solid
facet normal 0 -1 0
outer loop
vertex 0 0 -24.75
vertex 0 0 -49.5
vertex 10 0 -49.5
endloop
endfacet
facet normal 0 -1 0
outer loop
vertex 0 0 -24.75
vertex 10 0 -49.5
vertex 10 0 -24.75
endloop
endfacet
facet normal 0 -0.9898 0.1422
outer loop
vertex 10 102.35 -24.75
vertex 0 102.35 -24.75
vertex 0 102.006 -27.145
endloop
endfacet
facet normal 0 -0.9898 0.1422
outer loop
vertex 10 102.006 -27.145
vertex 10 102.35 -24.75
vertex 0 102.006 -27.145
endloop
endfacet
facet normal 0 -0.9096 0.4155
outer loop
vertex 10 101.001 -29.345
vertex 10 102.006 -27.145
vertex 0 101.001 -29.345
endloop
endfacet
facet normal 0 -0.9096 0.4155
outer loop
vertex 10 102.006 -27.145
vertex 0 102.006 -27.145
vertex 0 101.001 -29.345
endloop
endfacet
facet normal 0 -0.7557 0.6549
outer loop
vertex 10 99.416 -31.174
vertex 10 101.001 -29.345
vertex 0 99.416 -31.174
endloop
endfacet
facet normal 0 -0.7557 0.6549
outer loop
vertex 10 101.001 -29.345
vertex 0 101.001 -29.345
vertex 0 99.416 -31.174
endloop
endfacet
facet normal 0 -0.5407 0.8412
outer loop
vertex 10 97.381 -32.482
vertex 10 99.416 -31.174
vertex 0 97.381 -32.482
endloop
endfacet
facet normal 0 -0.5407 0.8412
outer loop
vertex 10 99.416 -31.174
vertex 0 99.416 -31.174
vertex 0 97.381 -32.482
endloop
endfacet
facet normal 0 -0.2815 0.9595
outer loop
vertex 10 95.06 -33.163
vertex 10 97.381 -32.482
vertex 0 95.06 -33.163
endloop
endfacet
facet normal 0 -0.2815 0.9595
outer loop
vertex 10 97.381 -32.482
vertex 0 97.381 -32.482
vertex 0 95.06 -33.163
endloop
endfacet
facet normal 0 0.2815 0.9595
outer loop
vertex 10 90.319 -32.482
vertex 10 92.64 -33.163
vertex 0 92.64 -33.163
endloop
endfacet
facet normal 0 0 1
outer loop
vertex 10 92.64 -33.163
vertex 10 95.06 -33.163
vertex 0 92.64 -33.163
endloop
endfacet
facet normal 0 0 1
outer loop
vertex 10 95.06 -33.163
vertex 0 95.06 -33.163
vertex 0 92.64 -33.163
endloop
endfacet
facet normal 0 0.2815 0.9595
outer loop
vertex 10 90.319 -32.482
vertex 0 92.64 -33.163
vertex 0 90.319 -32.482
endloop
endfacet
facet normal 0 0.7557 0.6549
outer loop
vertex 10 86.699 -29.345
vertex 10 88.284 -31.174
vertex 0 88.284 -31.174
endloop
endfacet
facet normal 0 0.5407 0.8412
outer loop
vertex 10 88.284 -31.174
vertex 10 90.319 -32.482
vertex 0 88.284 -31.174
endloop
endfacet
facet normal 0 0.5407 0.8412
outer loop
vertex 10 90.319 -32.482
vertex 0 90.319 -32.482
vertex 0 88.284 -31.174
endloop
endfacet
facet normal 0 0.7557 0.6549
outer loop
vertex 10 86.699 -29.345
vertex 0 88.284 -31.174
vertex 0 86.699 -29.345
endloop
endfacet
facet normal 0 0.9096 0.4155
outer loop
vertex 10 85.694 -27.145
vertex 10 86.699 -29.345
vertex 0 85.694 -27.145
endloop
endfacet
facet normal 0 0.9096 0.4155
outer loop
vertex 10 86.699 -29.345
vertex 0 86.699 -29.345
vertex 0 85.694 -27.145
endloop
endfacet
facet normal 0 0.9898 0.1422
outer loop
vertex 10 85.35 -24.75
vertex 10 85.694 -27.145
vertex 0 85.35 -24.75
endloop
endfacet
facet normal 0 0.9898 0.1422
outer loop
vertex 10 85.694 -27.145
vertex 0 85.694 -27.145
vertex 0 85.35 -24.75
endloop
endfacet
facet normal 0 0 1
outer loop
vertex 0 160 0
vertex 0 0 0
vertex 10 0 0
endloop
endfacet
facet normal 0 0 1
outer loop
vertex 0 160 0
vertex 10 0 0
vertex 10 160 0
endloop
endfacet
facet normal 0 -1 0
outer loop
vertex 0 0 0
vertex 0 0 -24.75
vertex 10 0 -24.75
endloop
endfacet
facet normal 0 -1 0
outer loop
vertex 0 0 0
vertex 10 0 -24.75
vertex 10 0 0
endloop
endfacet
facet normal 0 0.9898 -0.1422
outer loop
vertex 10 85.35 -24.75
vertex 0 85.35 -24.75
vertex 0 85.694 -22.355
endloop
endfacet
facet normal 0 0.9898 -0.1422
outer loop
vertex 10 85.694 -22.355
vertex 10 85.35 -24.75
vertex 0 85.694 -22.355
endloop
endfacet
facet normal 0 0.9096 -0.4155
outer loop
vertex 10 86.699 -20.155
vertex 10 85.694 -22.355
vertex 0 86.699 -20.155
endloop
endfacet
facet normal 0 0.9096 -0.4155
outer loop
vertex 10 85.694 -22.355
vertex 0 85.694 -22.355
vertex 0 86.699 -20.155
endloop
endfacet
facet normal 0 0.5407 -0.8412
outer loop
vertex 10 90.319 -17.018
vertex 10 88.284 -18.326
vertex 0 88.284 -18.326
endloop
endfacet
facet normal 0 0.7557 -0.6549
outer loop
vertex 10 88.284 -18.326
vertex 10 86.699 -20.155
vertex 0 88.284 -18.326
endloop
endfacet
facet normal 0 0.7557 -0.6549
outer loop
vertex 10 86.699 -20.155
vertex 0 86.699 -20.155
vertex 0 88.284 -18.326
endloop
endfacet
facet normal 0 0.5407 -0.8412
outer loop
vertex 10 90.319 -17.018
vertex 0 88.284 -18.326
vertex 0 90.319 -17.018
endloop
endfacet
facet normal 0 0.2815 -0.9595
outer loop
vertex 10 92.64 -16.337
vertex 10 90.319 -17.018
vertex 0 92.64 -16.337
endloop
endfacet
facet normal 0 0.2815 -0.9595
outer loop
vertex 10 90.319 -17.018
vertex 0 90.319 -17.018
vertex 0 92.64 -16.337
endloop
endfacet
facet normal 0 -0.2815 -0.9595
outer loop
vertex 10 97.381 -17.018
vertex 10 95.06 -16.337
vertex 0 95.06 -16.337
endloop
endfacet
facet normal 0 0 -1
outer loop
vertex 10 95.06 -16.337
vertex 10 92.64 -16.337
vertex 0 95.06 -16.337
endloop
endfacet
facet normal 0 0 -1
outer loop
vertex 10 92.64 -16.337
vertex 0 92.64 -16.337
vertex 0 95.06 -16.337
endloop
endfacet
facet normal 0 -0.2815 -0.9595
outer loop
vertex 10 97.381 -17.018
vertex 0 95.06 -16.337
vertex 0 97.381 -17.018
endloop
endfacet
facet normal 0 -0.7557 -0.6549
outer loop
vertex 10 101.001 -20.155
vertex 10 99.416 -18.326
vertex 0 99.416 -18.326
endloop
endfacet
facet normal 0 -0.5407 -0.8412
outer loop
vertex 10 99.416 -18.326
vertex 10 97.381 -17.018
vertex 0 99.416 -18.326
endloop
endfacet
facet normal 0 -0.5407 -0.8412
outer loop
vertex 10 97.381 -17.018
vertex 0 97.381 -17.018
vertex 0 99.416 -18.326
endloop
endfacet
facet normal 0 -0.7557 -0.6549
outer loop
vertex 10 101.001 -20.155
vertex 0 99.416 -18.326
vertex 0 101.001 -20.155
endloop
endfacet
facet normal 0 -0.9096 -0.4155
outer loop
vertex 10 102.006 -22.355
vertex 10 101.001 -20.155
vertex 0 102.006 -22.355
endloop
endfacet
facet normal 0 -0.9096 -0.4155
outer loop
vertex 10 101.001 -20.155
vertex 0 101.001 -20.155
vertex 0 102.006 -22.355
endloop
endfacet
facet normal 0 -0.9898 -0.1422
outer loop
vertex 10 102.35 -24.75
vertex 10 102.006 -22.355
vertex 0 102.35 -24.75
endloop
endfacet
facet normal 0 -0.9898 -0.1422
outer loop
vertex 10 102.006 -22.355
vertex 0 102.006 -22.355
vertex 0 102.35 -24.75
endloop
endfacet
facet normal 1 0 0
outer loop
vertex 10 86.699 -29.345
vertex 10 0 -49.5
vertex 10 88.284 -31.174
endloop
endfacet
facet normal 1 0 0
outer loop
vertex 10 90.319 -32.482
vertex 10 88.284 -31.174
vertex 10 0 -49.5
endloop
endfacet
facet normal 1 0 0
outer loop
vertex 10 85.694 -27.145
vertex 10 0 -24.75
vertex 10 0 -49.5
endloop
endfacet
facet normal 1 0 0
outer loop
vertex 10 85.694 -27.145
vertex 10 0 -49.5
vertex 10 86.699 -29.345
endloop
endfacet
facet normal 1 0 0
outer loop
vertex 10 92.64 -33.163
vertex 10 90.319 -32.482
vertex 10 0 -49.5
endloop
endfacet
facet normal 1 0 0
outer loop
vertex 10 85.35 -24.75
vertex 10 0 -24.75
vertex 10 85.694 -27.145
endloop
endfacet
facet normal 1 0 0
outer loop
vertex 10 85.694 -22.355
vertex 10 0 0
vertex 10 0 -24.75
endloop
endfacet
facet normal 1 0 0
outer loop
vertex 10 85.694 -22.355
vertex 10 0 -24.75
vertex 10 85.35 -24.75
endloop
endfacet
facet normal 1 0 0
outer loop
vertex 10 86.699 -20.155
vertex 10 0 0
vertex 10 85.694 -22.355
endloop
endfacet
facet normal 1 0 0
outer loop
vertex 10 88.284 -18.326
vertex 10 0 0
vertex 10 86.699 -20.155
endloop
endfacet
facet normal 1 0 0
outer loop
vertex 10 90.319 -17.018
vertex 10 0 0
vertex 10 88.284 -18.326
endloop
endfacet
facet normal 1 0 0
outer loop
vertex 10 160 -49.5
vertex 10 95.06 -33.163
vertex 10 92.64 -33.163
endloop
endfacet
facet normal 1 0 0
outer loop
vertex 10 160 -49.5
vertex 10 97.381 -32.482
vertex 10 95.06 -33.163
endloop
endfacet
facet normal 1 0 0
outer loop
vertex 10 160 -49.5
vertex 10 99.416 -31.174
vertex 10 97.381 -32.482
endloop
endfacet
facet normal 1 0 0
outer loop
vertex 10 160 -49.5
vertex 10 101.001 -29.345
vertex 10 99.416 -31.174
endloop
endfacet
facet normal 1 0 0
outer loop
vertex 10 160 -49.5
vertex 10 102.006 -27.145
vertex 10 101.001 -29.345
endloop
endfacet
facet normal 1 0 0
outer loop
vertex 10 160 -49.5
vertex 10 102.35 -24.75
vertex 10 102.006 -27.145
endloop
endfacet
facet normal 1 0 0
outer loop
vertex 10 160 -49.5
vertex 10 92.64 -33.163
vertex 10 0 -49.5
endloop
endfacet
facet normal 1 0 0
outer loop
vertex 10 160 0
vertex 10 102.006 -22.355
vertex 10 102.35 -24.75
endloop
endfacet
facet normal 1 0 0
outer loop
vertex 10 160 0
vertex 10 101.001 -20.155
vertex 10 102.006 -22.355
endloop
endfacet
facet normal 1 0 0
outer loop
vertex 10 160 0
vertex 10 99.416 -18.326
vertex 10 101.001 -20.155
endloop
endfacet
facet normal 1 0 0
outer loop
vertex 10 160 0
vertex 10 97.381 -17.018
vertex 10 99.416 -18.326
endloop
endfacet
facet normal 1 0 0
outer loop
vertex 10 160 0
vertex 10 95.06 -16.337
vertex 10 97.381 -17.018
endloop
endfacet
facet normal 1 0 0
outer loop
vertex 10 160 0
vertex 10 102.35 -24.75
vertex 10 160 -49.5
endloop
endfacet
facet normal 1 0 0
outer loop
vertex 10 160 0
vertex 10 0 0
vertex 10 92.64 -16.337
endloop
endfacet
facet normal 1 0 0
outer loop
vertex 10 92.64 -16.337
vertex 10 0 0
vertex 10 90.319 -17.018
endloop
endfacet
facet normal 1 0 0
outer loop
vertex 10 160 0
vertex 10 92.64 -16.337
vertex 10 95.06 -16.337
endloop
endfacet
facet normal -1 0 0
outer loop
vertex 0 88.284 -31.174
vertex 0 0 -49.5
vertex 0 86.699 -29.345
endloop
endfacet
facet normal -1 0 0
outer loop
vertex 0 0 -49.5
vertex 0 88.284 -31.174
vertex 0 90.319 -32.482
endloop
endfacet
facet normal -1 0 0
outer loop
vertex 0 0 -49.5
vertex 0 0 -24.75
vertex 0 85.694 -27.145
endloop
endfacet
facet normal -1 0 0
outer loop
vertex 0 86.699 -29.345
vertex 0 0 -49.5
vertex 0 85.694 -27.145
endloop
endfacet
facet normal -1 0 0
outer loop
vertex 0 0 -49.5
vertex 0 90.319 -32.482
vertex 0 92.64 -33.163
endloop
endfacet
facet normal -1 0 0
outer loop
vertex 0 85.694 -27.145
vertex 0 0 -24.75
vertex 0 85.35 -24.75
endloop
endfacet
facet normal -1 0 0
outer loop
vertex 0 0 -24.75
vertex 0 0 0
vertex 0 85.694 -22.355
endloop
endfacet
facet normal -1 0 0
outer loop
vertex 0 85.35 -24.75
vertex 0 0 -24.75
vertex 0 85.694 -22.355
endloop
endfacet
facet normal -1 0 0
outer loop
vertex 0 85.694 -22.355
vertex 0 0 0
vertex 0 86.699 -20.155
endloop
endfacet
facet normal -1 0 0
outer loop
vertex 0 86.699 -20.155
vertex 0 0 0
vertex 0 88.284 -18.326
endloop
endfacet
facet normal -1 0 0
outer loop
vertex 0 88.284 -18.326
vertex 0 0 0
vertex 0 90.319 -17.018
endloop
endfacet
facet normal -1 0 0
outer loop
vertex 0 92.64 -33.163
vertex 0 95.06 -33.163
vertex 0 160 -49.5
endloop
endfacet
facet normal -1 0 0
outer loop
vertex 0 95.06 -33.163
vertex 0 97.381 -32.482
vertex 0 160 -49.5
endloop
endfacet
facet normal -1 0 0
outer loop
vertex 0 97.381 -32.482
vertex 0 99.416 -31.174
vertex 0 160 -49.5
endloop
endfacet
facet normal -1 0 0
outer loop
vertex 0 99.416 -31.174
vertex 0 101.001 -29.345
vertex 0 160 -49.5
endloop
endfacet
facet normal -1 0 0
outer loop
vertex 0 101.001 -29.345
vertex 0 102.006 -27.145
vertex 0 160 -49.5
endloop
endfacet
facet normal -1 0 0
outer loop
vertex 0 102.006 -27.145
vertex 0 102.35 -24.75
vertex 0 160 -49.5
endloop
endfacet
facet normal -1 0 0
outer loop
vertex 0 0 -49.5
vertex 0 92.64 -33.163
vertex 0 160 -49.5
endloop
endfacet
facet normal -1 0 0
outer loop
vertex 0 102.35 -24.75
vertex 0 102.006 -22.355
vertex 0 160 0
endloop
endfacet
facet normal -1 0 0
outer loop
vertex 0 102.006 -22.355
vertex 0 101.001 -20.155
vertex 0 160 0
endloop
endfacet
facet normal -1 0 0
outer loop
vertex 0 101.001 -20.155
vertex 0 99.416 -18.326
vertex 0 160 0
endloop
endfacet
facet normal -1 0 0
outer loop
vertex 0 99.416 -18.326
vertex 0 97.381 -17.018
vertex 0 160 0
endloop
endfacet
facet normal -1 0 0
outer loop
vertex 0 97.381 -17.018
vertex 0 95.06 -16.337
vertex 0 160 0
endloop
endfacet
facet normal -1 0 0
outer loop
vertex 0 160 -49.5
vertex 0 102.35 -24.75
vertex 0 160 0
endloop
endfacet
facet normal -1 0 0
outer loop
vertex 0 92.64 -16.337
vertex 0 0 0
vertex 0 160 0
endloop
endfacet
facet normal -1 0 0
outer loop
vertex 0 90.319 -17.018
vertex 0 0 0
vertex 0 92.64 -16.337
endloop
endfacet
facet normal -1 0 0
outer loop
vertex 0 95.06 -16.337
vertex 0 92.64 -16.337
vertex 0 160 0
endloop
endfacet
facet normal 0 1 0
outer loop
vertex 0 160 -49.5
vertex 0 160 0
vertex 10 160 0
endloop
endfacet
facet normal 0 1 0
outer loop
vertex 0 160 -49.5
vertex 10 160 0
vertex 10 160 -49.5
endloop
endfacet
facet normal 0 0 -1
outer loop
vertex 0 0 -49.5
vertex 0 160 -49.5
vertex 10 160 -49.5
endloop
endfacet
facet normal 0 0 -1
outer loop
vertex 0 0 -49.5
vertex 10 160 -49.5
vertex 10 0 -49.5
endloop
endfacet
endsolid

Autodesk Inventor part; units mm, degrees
ref_plane "YZ Plane" through (0, 0, 0) normal (1, 0, 0) x (0, 1, 0)
ref_plane "XZ Plane" through (0, 0, 0) normal (0, 1, 0) x (-1, 0, 0)
ref_plane "XY Plane" through (0, 0, 0) normal (0, 0, 1) x (1, 0, 0)
sketch "Sketch1" plane through (0, 0, 0) normal (1, 0, 0) x (0, 1, 0)
  line L0 (0, 0) -> (160, 0)
  line L1 (160, 0) -> (160, -49.5)
  line L2 (160, -49.5) -> (0, -49.5)
  line L3 (0, -49.5) -> (0, 0)
  line L4 (0, -24.75) -> (93.85, -24.75)
  circle A0 centre (93.85, -24.75) radius 8.5
  dimension "d0" = 160
  dimension "d1" = 49.5
  dimension "d2" = 93.85
  dimension "d3" = 17
extrude "Extrusion1" add sketch "Sketch1" along normal blind 10
properties part number "tallwall3"
